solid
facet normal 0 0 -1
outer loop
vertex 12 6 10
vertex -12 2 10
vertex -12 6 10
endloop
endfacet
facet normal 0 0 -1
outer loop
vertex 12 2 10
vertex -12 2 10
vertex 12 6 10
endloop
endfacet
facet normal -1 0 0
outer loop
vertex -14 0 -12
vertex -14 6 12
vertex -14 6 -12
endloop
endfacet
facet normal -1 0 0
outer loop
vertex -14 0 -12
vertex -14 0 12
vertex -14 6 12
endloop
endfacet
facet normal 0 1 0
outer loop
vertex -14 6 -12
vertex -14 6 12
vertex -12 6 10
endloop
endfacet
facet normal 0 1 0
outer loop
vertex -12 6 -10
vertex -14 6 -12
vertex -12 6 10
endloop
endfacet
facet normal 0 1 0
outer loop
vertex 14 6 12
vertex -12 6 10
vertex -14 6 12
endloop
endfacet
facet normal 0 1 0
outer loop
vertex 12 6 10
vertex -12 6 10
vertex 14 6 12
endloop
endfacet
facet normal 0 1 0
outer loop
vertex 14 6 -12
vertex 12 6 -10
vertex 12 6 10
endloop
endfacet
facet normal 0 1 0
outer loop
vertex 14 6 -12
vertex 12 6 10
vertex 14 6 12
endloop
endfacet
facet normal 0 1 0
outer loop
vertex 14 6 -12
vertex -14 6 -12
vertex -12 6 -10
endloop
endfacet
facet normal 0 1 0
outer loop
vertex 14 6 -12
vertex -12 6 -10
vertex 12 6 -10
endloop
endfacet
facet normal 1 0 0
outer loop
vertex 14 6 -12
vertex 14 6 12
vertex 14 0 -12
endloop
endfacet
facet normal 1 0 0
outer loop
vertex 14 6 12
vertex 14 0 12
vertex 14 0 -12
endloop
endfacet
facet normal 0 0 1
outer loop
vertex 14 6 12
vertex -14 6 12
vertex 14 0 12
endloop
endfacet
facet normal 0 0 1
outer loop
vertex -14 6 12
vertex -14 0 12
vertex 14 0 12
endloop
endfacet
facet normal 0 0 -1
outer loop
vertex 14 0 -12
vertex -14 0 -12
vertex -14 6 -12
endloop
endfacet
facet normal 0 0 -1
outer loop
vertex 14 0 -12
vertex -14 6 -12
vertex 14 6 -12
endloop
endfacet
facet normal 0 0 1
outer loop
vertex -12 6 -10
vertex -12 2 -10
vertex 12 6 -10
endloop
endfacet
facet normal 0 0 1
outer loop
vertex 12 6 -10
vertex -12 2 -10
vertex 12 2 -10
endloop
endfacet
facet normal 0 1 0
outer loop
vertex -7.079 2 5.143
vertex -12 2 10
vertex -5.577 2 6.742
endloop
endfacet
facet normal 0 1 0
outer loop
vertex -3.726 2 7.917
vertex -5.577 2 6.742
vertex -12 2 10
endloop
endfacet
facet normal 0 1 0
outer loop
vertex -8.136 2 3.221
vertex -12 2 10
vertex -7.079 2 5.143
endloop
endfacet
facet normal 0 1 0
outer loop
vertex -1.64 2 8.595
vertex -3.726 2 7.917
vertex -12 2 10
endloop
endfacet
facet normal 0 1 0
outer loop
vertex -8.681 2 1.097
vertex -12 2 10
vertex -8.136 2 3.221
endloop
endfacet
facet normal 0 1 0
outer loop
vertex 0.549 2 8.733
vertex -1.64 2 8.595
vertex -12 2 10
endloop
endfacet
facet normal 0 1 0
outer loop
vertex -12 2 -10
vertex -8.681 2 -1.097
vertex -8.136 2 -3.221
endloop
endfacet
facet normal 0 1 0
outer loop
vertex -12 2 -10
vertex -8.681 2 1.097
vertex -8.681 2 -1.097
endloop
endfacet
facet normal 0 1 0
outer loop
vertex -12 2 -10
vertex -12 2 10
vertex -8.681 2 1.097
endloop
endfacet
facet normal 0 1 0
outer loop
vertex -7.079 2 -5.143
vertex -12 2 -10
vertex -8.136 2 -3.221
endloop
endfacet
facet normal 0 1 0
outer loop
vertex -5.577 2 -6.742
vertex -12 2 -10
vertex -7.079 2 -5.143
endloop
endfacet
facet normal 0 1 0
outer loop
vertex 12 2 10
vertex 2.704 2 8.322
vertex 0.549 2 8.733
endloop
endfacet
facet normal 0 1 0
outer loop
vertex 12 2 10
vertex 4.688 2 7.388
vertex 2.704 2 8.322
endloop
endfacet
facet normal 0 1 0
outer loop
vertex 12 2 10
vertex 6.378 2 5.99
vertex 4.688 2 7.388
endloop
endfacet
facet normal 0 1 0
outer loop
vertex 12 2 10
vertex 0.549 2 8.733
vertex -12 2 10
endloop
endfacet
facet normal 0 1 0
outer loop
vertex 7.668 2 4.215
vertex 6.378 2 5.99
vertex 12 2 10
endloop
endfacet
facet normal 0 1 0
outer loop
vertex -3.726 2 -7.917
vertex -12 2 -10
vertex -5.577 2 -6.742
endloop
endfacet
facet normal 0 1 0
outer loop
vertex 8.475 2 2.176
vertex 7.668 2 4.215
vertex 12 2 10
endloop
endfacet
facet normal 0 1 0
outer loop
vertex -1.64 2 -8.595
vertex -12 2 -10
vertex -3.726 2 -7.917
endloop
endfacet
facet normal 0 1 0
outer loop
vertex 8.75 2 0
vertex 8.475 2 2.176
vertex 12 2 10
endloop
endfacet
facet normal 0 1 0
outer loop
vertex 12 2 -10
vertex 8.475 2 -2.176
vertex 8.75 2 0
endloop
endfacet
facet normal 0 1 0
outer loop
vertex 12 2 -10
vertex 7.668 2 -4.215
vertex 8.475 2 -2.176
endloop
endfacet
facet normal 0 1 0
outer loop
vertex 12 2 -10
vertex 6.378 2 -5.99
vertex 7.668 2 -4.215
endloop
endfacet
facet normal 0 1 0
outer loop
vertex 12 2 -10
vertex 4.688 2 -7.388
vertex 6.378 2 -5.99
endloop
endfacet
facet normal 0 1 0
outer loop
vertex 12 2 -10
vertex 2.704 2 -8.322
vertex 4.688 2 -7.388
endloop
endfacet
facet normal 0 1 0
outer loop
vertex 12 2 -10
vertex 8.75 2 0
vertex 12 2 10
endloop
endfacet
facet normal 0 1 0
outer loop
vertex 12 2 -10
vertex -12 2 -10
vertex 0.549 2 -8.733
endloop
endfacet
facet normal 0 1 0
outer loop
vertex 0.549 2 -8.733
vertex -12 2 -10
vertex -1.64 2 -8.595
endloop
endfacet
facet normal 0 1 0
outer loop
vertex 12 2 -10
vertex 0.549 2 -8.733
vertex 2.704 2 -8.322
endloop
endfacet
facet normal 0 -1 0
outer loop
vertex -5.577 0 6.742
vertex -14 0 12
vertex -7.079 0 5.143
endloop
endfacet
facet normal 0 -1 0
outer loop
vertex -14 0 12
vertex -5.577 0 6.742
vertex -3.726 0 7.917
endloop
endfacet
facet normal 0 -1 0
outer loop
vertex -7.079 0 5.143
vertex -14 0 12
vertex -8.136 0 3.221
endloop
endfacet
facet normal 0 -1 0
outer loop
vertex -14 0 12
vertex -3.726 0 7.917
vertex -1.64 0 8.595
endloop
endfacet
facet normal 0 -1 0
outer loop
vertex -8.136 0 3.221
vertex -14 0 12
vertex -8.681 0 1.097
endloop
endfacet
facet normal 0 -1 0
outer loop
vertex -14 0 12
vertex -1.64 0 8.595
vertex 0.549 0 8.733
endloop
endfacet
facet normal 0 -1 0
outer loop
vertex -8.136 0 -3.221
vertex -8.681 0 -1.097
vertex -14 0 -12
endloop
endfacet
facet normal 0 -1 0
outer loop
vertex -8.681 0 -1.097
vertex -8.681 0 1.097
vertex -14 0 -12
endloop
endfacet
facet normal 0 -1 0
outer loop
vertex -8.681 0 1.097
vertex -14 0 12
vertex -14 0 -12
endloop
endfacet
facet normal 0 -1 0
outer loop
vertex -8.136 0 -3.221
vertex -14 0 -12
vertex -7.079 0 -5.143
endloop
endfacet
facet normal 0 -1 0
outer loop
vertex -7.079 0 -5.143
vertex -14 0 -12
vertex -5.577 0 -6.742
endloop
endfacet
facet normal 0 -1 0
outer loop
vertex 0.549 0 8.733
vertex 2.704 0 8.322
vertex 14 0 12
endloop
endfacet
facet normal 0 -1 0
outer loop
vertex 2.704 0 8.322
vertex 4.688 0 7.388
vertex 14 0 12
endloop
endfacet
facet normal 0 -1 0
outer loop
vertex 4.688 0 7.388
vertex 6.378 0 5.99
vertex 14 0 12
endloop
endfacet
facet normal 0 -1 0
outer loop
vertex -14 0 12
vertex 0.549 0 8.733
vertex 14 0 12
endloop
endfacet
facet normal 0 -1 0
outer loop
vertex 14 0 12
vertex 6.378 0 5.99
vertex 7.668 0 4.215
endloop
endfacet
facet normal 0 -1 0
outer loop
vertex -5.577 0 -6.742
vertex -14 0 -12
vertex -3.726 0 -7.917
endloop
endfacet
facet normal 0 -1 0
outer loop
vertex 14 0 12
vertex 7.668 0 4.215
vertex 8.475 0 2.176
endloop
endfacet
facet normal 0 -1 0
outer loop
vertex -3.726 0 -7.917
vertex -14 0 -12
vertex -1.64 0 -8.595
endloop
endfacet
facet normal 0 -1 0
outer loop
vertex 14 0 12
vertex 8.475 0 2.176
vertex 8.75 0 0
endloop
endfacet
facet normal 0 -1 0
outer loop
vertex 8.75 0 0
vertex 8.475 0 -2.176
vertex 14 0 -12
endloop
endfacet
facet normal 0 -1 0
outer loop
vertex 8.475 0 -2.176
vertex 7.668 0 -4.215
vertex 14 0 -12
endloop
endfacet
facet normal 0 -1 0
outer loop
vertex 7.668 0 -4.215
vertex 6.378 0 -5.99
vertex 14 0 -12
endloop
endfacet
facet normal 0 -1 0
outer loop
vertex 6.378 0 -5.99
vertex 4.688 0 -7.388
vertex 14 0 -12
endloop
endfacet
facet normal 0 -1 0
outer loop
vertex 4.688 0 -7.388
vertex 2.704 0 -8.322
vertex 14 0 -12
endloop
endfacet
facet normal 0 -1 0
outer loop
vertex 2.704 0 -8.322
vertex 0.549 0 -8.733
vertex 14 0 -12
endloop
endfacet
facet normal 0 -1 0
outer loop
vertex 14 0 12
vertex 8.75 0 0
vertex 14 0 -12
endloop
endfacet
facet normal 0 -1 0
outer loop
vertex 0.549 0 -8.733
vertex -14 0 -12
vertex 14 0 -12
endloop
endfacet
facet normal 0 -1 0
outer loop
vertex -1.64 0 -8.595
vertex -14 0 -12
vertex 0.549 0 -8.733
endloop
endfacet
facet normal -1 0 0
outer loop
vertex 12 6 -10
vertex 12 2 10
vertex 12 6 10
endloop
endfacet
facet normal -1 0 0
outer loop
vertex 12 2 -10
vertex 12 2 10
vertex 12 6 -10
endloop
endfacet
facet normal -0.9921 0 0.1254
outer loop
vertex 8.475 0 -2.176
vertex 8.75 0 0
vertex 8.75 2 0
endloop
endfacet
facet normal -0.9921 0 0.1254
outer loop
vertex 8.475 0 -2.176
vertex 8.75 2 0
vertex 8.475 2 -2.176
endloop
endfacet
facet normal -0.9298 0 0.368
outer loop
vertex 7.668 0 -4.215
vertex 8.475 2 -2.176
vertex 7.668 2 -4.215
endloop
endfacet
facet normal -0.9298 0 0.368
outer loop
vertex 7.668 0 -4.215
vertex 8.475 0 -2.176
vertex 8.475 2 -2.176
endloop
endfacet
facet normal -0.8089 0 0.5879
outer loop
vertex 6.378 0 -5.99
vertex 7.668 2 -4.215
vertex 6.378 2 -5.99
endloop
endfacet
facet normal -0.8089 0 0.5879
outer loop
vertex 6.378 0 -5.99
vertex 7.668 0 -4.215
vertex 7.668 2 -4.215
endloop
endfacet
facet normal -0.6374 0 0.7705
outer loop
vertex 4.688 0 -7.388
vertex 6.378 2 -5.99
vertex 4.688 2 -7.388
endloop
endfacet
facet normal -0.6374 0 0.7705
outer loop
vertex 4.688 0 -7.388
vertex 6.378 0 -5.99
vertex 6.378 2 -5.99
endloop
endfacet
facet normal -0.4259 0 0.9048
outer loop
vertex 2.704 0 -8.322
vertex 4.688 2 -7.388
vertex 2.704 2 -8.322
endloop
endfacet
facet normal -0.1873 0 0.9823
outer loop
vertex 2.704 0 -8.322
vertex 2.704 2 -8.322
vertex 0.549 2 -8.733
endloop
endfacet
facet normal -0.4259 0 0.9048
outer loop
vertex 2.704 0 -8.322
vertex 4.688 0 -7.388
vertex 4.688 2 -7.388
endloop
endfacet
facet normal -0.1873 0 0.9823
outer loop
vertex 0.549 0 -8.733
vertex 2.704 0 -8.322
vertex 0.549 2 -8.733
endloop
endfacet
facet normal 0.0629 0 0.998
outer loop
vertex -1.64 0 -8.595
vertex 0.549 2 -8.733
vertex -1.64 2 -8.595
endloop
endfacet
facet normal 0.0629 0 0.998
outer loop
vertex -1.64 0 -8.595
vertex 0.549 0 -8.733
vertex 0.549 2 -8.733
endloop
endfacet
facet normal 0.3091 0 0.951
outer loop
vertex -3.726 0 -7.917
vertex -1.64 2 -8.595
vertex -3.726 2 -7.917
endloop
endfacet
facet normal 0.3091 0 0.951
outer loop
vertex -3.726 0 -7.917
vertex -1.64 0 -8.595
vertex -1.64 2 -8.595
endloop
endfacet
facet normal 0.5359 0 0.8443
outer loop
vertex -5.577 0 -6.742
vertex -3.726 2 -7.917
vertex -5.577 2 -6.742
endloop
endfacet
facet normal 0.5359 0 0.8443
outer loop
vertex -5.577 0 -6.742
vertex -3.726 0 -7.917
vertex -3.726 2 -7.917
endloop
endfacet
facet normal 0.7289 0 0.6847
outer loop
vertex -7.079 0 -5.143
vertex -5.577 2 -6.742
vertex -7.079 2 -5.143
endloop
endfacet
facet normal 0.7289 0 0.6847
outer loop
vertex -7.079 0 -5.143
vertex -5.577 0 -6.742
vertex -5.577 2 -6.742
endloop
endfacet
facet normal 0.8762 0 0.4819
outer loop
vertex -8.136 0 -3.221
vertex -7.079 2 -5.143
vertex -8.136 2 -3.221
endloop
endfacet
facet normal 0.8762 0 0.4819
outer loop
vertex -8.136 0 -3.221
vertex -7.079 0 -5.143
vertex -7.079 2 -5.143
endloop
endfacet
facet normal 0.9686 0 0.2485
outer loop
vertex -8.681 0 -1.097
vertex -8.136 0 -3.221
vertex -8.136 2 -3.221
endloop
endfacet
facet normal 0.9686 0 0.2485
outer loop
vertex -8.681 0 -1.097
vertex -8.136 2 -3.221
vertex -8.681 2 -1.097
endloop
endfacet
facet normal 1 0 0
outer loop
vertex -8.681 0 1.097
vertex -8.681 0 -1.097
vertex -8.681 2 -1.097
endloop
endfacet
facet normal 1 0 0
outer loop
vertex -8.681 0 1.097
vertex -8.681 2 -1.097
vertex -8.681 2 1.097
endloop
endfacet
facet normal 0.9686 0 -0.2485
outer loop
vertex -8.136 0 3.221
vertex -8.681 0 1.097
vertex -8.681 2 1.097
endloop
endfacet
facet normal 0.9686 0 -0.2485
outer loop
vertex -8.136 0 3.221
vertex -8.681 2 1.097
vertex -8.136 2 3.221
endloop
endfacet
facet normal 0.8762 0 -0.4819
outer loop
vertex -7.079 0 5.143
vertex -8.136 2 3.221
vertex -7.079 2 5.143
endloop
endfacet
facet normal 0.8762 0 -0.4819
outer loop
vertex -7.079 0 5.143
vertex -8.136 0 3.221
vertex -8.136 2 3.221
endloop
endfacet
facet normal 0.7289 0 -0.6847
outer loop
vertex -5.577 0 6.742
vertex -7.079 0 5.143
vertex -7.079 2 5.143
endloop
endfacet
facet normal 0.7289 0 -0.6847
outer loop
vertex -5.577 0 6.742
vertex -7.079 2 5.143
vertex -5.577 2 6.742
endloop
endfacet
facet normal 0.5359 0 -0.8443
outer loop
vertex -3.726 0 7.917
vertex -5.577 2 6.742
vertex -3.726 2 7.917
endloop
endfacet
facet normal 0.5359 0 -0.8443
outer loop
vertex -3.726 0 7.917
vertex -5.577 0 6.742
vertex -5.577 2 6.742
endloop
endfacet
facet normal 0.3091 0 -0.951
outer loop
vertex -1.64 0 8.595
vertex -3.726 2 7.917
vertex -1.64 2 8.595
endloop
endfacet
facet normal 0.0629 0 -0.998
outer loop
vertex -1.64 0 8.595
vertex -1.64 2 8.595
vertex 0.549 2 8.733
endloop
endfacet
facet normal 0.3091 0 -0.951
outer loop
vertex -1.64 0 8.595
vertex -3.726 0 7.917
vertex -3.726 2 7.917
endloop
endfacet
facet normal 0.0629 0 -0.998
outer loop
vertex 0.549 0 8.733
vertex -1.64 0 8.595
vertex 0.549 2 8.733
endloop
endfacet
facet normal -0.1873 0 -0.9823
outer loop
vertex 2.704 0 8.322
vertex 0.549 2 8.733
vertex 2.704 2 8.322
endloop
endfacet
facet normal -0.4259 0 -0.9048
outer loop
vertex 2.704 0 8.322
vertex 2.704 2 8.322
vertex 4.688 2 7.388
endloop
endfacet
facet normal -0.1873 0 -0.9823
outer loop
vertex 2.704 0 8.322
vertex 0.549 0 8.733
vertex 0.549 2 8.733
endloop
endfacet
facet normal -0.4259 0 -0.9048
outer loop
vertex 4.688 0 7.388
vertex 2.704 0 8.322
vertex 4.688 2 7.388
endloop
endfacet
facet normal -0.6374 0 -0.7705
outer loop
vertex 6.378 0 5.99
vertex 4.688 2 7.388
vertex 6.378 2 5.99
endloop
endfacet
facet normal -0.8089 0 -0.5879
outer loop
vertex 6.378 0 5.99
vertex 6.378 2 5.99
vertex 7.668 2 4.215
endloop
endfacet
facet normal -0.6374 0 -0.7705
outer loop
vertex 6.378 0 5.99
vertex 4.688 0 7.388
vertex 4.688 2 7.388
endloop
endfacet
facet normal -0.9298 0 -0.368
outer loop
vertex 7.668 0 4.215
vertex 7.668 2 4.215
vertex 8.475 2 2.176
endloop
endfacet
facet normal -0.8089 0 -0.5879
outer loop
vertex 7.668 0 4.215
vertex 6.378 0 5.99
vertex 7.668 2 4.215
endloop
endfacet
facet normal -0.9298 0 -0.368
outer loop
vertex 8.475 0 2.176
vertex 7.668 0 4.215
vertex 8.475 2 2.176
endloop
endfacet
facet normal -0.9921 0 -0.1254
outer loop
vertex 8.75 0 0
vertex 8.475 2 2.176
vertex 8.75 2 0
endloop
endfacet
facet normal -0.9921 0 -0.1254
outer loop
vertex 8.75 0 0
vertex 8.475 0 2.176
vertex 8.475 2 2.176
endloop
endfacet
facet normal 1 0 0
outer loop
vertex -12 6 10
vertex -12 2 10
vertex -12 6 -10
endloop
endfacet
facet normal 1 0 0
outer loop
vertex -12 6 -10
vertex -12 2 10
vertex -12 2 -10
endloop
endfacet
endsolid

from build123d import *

# Parameters (mm, degrees)
SKETCH1_W           = 28
SKETCH1_H           = 24
SKETCH1_R           = 8.75
BOSS_EXTRUDE1_DEPTH = 2
SKETCH2_W           = 28
SKETCH2_H           = 24
SKETCH2_W_2         = 24
SKETCH2_H_2         = 20
BOSS_EXTRUDE2_DEPTH = 4


with BuildPart() as part:
    # Sketch1 → Boss-Extrude1 (new body)
    with BuildSketch(Plane(origin=(0, 0, 0), x_dir=(1, 0, 0), z_dir=(0, 1, 0))):
        Rectangle(SKETCH1_W, SKETCH1_H)
        Circle(SKETCH1_R, mode=Mode.SUBTRACT)
    extrude(amount=BOSS_EXTRUDE1_DEPTH)

    # Sketch2 → Boss-Extrude2 (add)
    with BuildSketch(Plane(origin=(0, 2, 0), x_dir=(1, 0, 0), z_dir=(0, 1, 0))):
        Rectangle(SKETCH2_W, SKETCH2_H)
        Rectangle(SKETCH2_W_2, SKETCH2_H_2, mode=Mode.SUBTRACT)
    extrude(amount=BOSS_EXTRUDE2_DEPTH)


solid = part.part
